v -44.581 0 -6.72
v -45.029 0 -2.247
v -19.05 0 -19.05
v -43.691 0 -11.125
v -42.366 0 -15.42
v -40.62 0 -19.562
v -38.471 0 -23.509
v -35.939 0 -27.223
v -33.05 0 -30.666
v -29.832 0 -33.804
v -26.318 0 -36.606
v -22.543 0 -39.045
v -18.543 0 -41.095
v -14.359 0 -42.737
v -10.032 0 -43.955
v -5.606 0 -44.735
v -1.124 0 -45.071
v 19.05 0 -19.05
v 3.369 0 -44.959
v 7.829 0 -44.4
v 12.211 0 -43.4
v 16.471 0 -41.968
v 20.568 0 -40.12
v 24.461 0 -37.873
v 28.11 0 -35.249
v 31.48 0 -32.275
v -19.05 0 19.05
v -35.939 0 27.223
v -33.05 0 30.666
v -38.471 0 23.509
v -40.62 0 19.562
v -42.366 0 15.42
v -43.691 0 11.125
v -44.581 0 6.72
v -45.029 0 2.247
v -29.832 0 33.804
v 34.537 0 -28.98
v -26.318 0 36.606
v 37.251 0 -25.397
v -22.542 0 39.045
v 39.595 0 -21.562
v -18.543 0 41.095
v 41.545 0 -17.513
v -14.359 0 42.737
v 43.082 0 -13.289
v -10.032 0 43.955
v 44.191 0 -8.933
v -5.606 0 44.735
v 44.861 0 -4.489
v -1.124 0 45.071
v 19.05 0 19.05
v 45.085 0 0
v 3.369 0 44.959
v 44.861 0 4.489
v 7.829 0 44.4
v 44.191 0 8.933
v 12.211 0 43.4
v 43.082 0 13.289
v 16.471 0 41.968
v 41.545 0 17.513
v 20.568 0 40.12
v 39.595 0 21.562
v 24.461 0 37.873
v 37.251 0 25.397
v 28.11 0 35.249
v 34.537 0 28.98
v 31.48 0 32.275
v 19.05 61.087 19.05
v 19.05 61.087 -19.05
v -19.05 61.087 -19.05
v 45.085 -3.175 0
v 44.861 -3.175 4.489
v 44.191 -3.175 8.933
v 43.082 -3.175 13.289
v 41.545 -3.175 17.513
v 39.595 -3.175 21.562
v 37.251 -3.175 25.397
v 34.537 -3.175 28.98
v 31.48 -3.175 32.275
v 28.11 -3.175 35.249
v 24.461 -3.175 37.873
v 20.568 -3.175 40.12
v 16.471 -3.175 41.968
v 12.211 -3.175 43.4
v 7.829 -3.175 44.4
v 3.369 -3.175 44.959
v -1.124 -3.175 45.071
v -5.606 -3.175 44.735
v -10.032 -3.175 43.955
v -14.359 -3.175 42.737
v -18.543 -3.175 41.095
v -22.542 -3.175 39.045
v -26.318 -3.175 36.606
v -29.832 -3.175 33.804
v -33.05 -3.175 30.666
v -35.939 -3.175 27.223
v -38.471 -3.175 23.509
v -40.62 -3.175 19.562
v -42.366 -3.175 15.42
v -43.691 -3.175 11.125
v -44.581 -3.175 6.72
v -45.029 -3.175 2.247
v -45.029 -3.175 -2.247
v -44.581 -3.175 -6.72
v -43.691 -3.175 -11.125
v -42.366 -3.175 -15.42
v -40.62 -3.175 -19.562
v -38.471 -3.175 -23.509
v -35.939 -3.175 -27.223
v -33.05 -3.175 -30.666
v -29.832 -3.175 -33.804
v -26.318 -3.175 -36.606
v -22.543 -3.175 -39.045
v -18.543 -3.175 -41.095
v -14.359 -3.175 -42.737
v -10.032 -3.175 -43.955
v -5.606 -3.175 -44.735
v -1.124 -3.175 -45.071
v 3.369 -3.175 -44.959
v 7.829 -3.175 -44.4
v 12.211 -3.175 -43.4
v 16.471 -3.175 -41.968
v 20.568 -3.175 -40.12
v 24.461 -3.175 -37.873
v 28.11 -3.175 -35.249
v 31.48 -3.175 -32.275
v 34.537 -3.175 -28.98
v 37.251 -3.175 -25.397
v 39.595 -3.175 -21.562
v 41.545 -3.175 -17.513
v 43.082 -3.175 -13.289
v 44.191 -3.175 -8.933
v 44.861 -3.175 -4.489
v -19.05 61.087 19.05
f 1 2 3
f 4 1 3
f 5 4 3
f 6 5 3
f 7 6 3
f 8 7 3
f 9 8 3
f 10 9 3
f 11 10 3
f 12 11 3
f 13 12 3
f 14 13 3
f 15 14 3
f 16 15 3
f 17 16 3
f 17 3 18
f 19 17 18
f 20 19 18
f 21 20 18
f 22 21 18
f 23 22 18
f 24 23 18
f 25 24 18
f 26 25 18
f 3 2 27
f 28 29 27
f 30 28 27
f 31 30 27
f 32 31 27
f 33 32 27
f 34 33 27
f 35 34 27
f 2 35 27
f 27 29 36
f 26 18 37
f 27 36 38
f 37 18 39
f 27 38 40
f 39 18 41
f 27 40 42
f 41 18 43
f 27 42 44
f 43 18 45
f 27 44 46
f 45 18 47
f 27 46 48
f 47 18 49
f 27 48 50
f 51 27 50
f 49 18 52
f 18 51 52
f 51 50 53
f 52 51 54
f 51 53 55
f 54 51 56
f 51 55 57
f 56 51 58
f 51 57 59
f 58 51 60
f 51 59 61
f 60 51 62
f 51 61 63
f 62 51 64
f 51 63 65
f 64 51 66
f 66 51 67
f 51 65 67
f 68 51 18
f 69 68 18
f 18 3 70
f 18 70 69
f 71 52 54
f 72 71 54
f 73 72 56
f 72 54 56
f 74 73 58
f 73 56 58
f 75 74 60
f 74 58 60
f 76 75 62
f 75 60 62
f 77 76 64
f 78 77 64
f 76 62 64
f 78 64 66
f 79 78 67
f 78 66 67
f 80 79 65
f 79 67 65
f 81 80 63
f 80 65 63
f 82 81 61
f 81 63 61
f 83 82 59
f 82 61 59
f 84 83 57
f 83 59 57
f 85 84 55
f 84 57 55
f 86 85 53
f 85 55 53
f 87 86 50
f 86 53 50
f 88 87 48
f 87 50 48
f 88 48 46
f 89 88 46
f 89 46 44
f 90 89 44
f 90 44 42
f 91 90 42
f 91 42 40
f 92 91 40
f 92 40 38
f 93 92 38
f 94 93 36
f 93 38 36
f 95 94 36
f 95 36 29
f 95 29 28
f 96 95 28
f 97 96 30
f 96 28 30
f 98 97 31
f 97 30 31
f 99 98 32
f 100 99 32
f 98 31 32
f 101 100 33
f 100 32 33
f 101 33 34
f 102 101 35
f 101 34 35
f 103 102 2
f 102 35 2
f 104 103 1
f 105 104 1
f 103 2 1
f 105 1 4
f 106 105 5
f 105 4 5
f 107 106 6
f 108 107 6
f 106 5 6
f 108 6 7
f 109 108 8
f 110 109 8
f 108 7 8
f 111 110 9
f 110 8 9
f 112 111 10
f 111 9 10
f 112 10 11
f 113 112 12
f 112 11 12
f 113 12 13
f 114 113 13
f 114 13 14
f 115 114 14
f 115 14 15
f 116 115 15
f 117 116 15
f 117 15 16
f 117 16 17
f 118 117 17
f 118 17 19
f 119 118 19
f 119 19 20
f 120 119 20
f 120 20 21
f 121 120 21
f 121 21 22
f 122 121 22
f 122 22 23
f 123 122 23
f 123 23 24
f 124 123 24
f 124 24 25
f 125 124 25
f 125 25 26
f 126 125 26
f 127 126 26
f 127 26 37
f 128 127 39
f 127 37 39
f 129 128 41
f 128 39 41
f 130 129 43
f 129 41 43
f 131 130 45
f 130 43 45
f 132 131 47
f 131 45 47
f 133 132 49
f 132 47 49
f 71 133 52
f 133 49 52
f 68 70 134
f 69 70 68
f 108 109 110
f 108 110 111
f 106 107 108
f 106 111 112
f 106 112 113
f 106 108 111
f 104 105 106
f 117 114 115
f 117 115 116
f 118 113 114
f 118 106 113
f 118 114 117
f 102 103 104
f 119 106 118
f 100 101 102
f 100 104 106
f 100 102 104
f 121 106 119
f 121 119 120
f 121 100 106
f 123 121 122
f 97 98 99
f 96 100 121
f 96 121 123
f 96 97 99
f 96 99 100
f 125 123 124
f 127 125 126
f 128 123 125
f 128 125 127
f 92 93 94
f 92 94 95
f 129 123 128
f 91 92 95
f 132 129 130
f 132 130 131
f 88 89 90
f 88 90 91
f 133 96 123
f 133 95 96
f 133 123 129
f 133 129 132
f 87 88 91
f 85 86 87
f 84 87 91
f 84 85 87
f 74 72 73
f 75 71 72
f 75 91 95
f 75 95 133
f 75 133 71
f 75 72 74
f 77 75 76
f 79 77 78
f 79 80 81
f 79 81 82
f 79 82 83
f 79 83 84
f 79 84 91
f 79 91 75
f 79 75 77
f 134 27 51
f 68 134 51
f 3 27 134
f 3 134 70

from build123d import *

# Parameters (mm, degrees)
SKETCH1_W           = 38.1
SKETCH1_H           = 38.1
BOSS_EXTRUDE1_DEPTH = 61.087
SKETCH2_R           = 45.085
BOSS_EXTRUDE2_DEPTH = 3.175


with BuildPart() as part:
    # Sketch1 → Boss-Extrude1 (new body)
    with BuildSketch(Plane(origin=(0, 0, 0), x_dir=(1, 0, 0), z_dir=(0, 1, 0))):
        Rectangle(SKETCH1_W, SKETCH1_H)
    extrude(amount=BOSS_EXTRUDE1_DEPTH)

    # Sketch2 → Boss-Extrude2 (add)
    with BuildSketch(Plane.XZ):
        Circle(SKETCH2_R)
    extrude(amount=BOSS_EXTRUDE2_DEPTH)


solid = part.part
